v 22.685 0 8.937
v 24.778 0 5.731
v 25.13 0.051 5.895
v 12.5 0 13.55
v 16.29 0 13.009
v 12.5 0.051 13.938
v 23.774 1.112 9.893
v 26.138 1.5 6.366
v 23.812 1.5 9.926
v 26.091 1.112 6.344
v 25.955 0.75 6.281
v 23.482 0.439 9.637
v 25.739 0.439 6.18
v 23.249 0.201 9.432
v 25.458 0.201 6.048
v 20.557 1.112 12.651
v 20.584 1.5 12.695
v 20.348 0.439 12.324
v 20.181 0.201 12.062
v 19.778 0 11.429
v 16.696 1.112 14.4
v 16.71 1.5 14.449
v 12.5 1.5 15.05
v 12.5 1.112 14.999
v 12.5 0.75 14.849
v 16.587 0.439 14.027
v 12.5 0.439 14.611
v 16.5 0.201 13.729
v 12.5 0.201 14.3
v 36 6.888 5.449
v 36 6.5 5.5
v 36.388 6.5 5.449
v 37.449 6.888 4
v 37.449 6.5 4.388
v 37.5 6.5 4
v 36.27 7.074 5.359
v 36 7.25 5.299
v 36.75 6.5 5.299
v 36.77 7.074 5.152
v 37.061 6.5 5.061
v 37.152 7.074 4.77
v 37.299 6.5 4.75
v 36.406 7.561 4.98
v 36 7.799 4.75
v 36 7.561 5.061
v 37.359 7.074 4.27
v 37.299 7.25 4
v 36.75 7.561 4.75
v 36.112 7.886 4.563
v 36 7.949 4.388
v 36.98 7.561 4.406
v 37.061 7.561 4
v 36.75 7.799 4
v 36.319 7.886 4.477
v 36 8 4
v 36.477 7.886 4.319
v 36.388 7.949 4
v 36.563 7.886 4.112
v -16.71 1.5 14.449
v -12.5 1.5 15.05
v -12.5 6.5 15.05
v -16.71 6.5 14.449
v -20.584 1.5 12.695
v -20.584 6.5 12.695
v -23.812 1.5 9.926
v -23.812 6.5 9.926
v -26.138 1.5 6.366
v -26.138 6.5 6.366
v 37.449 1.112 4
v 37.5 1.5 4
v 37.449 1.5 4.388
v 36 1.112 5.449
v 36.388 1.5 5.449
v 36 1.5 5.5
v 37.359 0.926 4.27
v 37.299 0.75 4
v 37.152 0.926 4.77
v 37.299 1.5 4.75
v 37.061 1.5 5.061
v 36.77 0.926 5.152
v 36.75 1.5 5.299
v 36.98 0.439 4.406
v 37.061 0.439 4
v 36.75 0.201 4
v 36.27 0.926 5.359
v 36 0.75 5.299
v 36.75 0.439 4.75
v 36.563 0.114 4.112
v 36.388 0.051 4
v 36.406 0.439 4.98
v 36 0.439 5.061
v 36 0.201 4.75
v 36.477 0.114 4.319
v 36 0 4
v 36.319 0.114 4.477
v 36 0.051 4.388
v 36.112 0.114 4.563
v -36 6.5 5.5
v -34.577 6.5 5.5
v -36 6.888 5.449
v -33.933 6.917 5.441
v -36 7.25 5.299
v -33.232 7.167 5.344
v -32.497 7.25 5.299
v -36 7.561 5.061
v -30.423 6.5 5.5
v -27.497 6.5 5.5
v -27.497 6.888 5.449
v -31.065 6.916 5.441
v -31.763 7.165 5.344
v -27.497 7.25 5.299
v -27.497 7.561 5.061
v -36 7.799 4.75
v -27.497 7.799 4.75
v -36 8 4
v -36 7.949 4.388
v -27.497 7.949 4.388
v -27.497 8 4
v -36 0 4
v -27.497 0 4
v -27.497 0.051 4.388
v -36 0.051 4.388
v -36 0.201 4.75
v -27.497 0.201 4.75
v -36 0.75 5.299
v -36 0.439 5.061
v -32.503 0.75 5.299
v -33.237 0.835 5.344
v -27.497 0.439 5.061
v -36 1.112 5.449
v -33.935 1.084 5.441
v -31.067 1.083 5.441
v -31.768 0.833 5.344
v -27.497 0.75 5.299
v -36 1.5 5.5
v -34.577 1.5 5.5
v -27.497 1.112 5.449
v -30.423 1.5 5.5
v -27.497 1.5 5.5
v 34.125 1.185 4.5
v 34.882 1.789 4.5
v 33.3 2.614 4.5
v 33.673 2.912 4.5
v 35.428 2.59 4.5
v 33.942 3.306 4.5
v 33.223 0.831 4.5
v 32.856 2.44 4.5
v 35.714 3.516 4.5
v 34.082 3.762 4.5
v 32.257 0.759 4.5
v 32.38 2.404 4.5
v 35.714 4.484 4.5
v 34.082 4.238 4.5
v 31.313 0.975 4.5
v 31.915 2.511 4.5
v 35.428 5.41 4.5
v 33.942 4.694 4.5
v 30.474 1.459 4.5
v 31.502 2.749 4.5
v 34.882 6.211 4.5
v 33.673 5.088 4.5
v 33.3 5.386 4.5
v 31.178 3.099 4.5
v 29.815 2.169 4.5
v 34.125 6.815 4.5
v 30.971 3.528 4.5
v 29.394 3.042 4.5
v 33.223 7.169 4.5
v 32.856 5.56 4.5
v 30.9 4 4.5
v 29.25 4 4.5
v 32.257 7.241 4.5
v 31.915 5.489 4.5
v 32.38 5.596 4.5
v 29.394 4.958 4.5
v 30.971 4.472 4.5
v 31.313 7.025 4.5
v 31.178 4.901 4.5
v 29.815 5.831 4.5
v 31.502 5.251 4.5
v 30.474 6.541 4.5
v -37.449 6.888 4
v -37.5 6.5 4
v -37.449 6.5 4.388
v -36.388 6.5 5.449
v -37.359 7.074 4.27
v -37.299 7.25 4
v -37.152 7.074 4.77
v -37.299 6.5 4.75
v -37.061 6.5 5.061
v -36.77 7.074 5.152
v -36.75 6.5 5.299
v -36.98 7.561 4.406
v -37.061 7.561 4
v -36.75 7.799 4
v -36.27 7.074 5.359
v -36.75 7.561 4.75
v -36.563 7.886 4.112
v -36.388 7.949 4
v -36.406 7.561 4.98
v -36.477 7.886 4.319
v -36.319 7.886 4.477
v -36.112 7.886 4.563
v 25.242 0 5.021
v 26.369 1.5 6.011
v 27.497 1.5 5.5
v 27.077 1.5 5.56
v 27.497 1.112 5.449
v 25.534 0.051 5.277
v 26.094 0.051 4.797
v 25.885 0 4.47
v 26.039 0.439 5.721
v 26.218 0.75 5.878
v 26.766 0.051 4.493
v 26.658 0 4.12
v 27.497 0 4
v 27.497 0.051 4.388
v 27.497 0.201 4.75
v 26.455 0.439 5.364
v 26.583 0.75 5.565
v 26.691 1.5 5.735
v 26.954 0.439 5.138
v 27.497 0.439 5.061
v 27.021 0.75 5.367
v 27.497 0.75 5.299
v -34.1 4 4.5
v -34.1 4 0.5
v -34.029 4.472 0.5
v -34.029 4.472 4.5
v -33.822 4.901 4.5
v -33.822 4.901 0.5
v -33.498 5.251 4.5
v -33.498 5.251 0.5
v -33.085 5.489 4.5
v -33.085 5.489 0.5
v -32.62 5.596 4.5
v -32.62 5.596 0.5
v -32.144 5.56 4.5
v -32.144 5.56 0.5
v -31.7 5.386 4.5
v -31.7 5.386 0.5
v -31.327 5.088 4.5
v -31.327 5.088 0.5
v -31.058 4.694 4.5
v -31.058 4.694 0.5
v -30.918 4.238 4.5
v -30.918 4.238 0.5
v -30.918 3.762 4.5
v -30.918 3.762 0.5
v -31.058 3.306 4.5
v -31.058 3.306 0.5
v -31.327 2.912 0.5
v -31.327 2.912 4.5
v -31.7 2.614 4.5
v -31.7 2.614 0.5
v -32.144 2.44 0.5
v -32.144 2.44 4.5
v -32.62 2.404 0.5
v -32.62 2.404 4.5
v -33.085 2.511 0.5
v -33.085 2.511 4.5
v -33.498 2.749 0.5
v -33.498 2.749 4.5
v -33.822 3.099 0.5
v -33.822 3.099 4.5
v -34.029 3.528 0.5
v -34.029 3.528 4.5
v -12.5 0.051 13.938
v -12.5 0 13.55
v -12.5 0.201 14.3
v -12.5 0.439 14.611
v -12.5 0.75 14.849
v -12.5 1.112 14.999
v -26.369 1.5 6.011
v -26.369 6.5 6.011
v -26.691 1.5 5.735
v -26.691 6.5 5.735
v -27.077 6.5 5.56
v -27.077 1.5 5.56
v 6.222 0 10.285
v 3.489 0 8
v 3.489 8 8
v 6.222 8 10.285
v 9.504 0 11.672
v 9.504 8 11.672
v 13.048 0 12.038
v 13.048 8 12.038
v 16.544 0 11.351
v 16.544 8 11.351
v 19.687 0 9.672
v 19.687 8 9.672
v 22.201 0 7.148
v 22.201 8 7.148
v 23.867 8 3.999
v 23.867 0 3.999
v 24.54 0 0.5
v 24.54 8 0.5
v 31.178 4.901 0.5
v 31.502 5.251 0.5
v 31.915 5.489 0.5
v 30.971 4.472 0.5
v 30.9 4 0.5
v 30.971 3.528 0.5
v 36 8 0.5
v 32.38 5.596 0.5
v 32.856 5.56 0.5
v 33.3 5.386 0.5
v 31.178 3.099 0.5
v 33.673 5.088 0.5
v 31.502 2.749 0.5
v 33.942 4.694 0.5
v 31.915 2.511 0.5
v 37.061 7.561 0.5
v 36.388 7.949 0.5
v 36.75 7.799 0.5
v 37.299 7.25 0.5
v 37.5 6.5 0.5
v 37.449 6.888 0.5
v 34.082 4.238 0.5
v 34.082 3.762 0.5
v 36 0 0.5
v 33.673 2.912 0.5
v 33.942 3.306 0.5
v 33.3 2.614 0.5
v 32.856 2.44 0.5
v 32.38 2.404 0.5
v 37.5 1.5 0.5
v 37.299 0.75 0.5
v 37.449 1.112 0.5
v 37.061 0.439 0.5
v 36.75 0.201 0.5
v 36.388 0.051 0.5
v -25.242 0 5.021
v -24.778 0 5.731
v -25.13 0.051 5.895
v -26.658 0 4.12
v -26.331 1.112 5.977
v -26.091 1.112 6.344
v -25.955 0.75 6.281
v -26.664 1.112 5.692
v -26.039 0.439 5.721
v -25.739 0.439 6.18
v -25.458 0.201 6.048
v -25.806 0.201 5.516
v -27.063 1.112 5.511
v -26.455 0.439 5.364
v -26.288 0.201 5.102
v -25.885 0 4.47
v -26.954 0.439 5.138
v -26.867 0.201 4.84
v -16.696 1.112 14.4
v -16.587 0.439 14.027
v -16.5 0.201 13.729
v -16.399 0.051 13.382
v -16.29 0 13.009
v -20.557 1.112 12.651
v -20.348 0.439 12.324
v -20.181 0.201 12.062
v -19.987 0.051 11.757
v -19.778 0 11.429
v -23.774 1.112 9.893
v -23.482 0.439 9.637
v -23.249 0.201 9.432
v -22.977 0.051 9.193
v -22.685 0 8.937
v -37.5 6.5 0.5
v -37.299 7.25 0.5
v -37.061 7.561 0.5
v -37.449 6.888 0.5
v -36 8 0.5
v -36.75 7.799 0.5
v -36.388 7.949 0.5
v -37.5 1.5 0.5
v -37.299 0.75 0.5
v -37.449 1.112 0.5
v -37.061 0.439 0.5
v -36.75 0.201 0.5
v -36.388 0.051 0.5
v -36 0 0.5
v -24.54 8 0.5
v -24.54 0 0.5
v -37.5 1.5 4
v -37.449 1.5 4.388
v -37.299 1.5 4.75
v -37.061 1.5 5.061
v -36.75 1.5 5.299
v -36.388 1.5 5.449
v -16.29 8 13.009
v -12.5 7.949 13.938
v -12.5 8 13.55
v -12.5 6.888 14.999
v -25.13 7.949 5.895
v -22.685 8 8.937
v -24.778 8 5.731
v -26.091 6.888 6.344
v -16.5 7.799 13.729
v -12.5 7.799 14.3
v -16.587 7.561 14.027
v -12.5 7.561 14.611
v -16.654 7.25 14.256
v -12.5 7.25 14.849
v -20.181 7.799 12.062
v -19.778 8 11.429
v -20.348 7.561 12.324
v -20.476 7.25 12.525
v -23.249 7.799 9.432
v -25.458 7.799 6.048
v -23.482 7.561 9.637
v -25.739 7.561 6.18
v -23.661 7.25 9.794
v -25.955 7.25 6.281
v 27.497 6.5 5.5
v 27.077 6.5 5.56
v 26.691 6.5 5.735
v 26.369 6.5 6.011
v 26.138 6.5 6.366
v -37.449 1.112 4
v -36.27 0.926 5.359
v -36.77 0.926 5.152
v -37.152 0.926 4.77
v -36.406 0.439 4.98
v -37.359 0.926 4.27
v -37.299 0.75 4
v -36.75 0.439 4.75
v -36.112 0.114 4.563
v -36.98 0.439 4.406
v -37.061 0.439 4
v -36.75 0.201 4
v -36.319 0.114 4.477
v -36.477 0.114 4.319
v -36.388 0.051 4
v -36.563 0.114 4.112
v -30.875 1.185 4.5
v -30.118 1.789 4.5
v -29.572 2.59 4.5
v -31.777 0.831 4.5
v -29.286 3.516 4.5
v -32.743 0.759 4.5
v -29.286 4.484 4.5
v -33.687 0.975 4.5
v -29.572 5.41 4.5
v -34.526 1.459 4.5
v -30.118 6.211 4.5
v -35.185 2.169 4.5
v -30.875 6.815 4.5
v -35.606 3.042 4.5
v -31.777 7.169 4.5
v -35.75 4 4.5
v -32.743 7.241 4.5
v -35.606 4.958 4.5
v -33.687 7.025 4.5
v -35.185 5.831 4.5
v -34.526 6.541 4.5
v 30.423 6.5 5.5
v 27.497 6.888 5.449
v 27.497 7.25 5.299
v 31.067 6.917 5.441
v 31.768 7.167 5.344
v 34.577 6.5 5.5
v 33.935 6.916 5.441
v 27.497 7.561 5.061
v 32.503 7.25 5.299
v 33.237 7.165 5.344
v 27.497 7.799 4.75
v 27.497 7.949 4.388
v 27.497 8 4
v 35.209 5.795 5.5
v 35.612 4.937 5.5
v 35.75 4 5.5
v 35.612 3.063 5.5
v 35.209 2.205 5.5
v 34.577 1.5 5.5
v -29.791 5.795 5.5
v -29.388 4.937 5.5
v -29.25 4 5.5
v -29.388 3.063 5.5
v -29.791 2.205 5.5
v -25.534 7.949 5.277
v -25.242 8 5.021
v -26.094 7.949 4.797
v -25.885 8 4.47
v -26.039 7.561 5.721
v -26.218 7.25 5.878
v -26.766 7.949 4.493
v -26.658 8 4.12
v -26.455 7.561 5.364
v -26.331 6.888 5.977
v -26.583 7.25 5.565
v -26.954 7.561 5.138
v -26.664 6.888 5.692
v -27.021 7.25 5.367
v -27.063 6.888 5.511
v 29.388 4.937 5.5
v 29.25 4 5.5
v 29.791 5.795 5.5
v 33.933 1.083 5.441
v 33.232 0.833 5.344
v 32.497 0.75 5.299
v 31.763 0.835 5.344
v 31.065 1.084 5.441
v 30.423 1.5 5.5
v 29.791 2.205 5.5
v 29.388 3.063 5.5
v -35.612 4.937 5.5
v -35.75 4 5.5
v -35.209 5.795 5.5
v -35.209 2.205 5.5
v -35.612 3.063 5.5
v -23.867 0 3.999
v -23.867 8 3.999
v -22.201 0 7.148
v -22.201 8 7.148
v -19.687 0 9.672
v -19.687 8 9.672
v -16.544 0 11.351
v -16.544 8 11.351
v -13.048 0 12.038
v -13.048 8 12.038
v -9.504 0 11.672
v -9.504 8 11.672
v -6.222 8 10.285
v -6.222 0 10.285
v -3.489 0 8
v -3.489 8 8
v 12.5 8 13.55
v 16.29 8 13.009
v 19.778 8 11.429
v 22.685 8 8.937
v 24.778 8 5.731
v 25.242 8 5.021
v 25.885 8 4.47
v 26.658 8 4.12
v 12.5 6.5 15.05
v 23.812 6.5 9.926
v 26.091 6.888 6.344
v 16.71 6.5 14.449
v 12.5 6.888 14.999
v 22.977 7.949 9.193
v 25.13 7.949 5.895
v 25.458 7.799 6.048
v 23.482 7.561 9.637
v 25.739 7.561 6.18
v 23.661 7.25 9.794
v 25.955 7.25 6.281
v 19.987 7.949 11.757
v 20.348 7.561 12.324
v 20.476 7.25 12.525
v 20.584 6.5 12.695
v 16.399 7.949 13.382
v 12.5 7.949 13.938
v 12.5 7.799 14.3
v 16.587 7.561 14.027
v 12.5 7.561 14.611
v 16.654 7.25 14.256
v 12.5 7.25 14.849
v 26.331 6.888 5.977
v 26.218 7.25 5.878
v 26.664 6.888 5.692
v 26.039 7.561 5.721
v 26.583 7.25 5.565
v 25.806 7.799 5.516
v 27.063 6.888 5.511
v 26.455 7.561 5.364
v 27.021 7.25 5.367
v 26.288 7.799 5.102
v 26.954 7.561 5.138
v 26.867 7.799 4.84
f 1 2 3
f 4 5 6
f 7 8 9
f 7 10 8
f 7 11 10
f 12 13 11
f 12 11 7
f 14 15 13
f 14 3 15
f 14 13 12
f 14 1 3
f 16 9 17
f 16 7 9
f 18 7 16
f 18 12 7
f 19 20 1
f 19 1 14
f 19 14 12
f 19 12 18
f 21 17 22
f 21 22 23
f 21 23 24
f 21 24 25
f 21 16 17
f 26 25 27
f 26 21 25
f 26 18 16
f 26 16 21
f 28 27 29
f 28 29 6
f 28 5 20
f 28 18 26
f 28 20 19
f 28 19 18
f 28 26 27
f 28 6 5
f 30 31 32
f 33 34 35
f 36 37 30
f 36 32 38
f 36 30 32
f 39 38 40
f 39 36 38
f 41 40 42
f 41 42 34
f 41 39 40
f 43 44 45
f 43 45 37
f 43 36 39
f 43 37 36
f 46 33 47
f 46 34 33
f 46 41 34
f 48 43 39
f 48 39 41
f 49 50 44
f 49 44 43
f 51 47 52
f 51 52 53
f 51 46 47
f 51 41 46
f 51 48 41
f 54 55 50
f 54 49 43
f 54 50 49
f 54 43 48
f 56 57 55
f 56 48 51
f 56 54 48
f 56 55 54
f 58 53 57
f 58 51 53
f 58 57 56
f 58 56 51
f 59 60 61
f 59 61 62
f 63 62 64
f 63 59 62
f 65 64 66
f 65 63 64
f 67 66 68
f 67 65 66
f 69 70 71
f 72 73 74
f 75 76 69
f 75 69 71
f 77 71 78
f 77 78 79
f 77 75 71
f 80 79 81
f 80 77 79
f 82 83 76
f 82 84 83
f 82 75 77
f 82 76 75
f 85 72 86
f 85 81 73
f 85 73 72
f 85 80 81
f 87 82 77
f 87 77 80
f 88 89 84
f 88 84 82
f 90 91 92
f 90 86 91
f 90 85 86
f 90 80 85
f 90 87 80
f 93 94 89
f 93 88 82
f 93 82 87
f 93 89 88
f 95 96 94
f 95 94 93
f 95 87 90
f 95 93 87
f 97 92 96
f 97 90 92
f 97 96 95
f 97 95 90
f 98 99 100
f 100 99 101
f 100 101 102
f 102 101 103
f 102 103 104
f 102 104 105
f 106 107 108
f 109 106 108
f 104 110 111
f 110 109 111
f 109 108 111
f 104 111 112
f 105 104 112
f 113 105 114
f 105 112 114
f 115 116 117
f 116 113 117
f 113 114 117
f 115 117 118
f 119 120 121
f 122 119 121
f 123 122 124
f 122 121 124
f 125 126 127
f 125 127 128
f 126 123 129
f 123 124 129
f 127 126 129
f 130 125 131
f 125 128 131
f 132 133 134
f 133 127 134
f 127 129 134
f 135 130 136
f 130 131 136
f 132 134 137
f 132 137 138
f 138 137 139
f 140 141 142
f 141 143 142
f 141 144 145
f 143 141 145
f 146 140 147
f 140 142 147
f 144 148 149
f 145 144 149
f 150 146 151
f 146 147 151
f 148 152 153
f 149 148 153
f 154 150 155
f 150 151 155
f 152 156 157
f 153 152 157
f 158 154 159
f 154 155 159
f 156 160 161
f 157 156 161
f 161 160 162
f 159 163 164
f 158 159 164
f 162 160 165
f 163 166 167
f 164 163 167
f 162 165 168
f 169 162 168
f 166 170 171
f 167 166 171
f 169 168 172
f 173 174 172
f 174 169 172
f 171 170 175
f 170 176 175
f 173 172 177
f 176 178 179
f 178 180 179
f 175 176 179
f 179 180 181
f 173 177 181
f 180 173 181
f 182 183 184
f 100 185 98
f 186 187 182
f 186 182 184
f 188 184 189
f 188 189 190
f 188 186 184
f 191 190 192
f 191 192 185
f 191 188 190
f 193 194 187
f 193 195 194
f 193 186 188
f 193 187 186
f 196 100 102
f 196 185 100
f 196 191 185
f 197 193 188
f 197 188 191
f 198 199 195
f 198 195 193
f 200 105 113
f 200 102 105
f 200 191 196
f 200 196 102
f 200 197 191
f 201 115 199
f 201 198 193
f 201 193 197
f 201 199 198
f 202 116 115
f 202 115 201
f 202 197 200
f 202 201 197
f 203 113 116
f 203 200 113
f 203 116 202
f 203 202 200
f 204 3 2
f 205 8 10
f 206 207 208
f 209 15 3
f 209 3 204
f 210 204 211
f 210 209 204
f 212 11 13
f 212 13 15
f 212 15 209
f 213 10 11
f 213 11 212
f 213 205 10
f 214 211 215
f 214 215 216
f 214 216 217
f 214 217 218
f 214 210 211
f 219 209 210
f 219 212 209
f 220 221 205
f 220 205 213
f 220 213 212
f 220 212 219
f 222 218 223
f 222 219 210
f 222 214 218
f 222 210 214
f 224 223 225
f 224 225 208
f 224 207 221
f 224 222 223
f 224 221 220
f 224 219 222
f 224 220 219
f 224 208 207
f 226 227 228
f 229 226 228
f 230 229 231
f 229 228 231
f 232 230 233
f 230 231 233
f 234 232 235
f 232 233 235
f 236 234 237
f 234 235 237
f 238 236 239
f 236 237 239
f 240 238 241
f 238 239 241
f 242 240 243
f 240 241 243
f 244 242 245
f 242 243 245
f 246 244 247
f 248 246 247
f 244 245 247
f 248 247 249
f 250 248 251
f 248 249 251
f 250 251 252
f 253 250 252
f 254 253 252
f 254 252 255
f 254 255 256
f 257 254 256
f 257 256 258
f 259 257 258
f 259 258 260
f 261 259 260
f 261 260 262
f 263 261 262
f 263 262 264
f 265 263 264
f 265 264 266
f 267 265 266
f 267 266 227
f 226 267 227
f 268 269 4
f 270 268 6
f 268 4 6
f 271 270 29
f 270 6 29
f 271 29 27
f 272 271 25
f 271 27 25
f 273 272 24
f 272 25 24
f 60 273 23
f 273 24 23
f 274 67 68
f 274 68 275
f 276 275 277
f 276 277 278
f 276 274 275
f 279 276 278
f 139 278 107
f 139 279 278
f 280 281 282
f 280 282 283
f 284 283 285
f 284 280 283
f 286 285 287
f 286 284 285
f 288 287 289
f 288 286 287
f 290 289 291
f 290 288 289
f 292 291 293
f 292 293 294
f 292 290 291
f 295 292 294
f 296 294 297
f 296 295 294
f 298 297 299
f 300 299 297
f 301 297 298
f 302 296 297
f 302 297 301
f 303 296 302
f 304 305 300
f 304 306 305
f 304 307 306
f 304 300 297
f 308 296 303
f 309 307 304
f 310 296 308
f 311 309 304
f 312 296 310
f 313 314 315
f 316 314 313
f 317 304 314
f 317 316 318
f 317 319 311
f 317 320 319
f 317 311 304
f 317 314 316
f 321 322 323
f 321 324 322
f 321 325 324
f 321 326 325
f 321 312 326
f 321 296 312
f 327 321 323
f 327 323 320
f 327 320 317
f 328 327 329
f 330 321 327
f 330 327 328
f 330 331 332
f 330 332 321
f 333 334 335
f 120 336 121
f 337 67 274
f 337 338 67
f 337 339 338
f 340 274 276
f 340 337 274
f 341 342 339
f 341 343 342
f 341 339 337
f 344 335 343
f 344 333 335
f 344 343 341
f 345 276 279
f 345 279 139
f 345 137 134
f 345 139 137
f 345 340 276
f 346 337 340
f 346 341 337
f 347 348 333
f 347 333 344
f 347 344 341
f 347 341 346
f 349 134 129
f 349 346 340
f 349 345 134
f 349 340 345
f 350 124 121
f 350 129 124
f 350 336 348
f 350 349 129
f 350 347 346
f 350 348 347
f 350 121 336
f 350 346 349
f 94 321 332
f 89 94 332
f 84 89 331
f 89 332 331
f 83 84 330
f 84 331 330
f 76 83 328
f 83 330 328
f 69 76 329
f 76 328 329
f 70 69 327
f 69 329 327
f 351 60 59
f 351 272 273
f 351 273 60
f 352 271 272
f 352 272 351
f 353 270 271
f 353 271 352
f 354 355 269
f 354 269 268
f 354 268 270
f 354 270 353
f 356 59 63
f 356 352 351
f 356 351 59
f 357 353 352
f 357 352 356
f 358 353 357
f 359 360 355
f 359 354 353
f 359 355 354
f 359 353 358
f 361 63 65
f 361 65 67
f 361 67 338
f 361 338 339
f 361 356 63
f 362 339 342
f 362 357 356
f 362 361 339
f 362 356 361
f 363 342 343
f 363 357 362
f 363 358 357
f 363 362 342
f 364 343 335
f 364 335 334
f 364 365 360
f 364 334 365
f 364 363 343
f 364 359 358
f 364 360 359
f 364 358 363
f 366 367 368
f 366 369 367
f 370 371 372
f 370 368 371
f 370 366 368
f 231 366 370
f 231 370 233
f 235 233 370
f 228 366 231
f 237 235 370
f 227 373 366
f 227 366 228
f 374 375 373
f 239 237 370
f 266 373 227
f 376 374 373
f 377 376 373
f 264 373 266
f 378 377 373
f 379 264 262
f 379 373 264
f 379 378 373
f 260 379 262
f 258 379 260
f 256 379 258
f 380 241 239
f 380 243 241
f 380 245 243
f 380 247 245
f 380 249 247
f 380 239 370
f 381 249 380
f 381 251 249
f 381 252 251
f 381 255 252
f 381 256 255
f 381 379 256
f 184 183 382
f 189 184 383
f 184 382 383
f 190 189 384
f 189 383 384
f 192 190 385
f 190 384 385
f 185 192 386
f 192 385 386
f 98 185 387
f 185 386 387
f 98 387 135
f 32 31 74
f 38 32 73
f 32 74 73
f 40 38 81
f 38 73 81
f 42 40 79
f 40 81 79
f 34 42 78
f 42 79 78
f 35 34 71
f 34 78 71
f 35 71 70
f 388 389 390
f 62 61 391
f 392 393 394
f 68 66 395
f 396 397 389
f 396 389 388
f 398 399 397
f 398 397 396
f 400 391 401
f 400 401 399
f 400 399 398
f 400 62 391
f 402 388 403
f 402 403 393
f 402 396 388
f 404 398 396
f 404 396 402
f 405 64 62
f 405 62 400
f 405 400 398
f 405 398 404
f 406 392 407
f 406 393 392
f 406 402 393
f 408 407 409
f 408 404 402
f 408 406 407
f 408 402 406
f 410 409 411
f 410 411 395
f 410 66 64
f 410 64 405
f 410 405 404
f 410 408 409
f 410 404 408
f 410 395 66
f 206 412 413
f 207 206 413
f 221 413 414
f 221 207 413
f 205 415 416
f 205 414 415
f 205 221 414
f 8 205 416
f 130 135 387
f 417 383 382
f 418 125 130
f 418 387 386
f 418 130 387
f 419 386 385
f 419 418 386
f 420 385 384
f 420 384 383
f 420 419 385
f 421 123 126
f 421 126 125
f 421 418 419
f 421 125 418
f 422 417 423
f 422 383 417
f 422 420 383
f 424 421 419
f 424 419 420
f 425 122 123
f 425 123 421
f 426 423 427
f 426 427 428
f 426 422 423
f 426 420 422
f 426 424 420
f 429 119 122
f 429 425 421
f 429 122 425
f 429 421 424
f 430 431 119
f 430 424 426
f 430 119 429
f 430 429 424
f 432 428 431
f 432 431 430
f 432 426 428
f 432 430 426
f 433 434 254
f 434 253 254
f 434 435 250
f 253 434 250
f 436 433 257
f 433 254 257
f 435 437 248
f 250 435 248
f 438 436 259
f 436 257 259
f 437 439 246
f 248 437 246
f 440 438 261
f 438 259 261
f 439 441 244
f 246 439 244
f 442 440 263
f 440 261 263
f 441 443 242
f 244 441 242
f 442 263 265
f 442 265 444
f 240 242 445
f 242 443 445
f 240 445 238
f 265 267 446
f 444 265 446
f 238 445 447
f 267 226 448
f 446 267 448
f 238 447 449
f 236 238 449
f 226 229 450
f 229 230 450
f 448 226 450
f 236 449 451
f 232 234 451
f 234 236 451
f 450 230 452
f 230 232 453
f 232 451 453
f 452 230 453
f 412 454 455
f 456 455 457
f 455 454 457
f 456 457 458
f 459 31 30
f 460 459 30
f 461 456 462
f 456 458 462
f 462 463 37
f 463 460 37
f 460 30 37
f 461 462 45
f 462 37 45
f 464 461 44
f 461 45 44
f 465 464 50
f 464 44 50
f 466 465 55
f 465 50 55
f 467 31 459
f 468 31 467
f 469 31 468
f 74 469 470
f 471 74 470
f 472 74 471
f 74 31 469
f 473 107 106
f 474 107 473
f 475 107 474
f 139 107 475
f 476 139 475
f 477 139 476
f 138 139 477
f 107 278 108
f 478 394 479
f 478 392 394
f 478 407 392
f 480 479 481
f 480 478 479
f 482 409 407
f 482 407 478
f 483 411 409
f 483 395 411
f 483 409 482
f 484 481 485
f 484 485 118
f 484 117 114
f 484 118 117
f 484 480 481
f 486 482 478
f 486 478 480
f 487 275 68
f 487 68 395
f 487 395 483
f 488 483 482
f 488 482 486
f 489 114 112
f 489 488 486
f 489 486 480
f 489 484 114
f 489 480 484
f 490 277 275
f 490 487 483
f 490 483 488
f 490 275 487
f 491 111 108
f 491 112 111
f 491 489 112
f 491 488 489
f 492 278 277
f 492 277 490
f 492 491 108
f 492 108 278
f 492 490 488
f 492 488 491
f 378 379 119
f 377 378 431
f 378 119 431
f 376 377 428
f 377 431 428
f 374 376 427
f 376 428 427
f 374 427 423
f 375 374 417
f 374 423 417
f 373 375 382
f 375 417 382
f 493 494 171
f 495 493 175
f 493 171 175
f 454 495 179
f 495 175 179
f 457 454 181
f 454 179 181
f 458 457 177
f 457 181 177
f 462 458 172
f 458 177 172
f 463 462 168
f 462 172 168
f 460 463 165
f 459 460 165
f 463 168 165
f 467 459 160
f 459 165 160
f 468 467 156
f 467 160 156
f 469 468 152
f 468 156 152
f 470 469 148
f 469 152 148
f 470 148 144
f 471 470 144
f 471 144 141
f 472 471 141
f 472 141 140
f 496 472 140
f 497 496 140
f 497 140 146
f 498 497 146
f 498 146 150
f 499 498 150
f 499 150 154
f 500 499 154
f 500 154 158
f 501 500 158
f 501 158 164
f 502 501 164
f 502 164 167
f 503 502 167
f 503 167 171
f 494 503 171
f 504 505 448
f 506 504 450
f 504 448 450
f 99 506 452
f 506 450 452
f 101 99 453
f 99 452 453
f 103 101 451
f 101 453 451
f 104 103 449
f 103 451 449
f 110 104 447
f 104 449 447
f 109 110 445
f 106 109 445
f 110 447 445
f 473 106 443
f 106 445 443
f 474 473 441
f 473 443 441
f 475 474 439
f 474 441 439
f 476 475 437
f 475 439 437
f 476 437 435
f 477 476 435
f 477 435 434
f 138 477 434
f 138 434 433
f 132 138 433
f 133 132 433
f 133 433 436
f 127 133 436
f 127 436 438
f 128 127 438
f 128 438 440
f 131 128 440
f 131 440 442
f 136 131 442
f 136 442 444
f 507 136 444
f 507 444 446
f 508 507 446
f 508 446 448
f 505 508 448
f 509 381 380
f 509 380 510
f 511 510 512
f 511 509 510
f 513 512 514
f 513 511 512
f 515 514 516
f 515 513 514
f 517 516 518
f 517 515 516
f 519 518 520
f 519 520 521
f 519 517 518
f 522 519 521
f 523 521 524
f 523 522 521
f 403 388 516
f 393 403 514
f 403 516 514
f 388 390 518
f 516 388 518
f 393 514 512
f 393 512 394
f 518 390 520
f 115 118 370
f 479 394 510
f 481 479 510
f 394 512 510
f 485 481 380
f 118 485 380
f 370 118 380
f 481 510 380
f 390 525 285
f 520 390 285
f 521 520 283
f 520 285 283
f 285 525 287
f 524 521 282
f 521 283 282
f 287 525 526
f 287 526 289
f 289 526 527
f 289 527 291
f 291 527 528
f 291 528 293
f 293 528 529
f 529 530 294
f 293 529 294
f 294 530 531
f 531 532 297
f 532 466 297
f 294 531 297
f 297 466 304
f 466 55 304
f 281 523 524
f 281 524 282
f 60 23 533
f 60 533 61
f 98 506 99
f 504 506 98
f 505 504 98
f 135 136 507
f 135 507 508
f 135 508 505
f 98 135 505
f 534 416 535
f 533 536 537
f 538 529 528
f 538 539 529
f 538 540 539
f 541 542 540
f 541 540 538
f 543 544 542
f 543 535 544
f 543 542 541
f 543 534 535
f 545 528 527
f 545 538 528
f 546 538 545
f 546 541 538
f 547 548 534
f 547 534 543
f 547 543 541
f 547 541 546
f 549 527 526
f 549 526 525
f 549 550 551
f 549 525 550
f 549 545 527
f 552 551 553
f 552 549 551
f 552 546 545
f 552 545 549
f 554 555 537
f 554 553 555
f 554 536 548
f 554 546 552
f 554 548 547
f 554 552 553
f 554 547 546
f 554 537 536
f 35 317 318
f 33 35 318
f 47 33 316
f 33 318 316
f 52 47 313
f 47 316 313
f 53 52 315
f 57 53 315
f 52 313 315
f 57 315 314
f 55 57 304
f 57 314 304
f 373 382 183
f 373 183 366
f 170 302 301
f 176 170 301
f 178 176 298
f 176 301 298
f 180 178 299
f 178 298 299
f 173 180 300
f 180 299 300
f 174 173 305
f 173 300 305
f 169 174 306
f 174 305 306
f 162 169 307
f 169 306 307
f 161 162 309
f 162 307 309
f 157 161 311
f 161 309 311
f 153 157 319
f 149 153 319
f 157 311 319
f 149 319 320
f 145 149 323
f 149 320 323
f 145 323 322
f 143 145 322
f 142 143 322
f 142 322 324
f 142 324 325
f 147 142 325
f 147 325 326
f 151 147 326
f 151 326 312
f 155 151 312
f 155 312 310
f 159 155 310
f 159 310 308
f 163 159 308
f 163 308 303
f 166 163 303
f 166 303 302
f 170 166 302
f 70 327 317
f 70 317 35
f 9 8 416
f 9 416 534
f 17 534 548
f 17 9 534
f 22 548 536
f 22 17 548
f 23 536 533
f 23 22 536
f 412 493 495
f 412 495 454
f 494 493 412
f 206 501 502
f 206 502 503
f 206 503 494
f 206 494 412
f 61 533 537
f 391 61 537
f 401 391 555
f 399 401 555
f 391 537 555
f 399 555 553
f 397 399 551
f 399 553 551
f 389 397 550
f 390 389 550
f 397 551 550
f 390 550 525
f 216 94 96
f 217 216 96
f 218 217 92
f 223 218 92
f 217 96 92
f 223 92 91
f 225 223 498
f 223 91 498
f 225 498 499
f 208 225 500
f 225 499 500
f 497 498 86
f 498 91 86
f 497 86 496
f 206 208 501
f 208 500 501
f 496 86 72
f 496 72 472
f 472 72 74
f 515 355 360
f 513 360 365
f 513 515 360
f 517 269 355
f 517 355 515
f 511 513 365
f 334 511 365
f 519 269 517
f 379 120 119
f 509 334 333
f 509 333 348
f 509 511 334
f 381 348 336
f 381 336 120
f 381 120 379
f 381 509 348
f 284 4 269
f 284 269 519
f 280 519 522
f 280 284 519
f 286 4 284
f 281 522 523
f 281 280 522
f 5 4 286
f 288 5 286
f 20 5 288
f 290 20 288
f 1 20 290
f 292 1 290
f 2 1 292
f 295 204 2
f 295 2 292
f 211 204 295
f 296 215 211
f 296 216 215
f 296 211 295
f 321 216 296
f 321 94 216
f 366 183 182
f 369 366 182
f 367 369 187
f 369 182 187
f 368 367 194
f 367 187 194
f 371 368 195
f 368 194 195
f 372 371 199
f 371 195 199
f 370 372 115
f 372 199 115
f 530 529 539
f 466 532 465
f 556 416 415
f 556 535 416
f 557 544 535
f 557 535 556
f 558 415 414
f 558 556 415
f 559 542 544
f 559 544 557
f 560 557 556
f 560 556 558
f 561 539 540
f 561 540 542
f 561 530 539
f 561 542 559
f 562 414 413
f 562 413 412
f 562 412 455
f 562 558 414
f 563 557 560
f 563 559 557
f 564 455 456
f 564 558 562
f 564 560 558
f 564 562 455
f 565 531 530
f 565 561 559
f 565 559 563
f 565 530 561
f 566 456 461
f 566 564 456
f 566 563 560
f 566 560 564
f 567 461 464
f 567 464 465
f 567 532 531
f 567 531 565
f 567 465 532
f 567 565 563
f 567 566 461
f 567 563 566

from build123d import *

# Parameters (mm, degrees)
BOSS_EXTRU_1_DEPTH      = 8
ESQUISSE2_R             = 1.6
ENL_V_MAT_EXTRU_1_DEPTH = 42.011614209
ENL_V_START             = -4
ESQUISSE3_R             = 3.25
ENL_V_MAT_EXTRU_2_DEPTH = 38.011614209
CONG_1_R                = 1.5


with BuildPart() as part:
    # Esquisse1 → Boss.-Extru.1 (new body)
    with BuildSketch(Plane(origin=(0, 0, 0), x_dir=(1, 0, 0), z_dir=(0, 1, 0))):
        with BuildLine():
            Line((-37.5, -0.5), (-24.539622087, -0.5))
            ThreePointArc((-24.539622087, -0.5), (-16.544164933, -11.351089375), (-3.488757022, -8))
            Line((-3.488757022, -8), (3.488757022, -8))
            ThreePointArc((3.488757022, -8), (16.544164933, -11.351089375), (24.539622087, -0.5))
            Line((24.539622087, -0.5), (37.5, -0.5))
            Line((37.5, -0.5), (37.5, -5.5))
            Line((37.5, -5.5), (26.509014955, -5.5))
            ThreePointArc((26.509014955, -5.5), (20.977248964, -12.435382986), (12.5, -15.05))
            Line((12.5, -15.05), (-12.5, -15.05))
            ThreePointArc((-12.5, -15.05), (-20.977248964, -12.435382986), (-26.509014955, -5.5))
            Line((-26.509014955, -5.5), (-37.5, -5.5))
            Line((-37.5, -5.5), (-37.5, -0.5))
        make_face()
    extrude(amount=BOSS_EXTRU_1_DEPTH)

    # Esquisse2 → Enlèv. mat.-Extru.1 (cut, through all)
    with BuildSketch(Plane(origin=(0, 0, 0.5), x_dir=(-1, 0, 0), z_dir=(0, 0, -1))):
        with Locations((32.5, 4)):
            Circle(ESQUISSE2_R)
        with Locations((-32.5, 4)):
            Circle(ESQUISSE2_R)
    extrude(amount=-ENL_V_MAT_EXTRU_1_DEPTH, mode=Mode.SUBTRACT)

    # Esquisse3 → Enlèv. mat.-Extru.2 (cut, through all)
    with BuildSketch(Plane(origin=(0, 0, 0.5), x_dir=(-1, 0, 0), z_dir=(0, 0, -1)).offset(ENL_V_START)):
        with Locations((32.5, 4)):
            Circle(ESQUISSE3_R)
        with Locations((-32.5, 4)):
            Circle(ESQUISSE3_R)
    extrude(amount=-ENL_V_MAT_EXTRU_2_DEPTH, mode=Mode.SUBTRACT)

    # Congé1
    # the kernel refuses this fillet: 1.5 mm, written as the material it adds along each edge
    with BuildSketch(Plane(origin=(26.509014955, 0, 5.5), x_dir=(-0.3943977660181821, 0, 0.9189398251027471), z_dir=(0, 1, 0))) as cong_1_piece_1:
        with BuildLine():
            CenterArc((0.988849381, 1.499265395), CONG_1_R, 203.228419566, 64.978347937)
            Line((-0.389560356, 0.907668746), (0, 0))
            ThreePointArc((0, 0), (0.470955164, 0.007370535), (0.941910328, 0))
        make_face()
    extrude(amount=8)
    with BuildSketch(Plane(origin=(-26.509014955, 0, 5.5), x_dir=(0.3943977660181821, 0, 0.9189398251027471), z_dir=(0, 1, 0))) as cong_1_piece_2:
        with BuildLine():
            CenterArc((0.988849381, -1.499265395), CONG_1_R, 91.793232497, 64.978347937)
            Line((-0.389560356, -0.907668746), (0, 0))
            ThreePointArc((0, 0), (0.470955164, -0.007370535), (0.941910328, 0))
        make_face()
    extrude(amount=8)
    # the kernel refuses this fillet: 1.5 mm, written as the material it takes off along each edge
    with BuildSketch(Plane(origin=(37.5, 0, -3.25), x_dir=(-1, 0, 0), z_dir=(0, 0, 1)), Plane(origin=(-37.5, 0, 9.25), x_dir=(1, 0, 0), z_dir=(0, 0, -1))) as cong_1_2_piece_1:
        with BuildLine():
            CenterArc((CONG_1_R, -CONG_1_R), CONG_1_R, 90, 90)
            Line((0, -CONG_1_R), (0, 0))
            Line((0, 0), (CONG_1_R, 0))
        make_face()
    extrude(amount=12.5, mode=Mode.SUBTRACT)
    with BuildSketch(Plane(origin=(-37.5, 8, 9.25), x_dir=(1, 0, 0), z_dir=(0, 0, -1)), Plane(origin=(37.5, 8, -3.25), x_dir=(-1, 0, 0), z_dir=(0, 0, 1))) as cong_1_2_piece_2:
        with BuildLine():
            CenterArc((CONG_1_R, CONG_1_R), CONG_1_R, 180, 90)
            Line((0, CONG_1_R), (0, 0))
            Line((0, 0), (CONG_1_R, 0))
        make_face()
    extrude(amount=12.5, mode=Mode.SUBTRACT)
    with BuildSketch(Plane(origin=(37.5, -3.75, 5.5), x_dir=(0, 0, -1), z_dir=(0, 1, 0)), Plane(origin=(-37.5, -3.75, 5.5), x_dir=(1, 0, 0), z_dir=(0, 1, 0))) as cong_1_2_piece_3:
        with BuildLine():
            CenterArc((CONG_1_R, CONG_1_R), CONG_1_R, 180, 90)
            Line((0, CONG_1_R), (0, 0))
            Line((0, 0), (CONG_1_R, 0))
        make_face()
    extrude(amount=15.5, mode=Mode.SUBTRACT)
    # the kernel refuses this fillet: 1.5 mm, written as the material it takes off along each edge
    with BuildSketch(Plane(origin=(36, 6.5, 4), x_dir=(0, 0, 1), z_dir=(0, 1, 0))) as cong_1_3_piece_1_section:
        Polygon((0, 0), (CONG_1_R, 0), (CONG_1_R, CONG_1_R), (0, CONG_1_R), align=None)
    cong_1_3_piece_1 = extrude(amount=CONG_1_R, mode=Mode.PRIVATE)
    cong_1_3_piece_1 = cong_1_3_piece_1 - Plane(origin=(36, 6.5, 4), x_dir=(-0.7071067811865475, 0, -0.7071067811865475), z_dir=(0, 1, 0)) * Sphere(CONG_1_R, mode=Mode.PRIVATE)
    add(cong_1_3_piece_1, mode=Mode.SUBTRACT)
    with BuildSketch(Plane(origin=(-36, 6.5, 4), x_dir=(0, 0, 1), z_dir=(0, 1, 0))) as cong_1_3_piece_2_section:
        Polygon((0, 0), (CONG_1_R, 0), (CONG_1_R, -CONG_1_R), (0, -CONG_1_R), align=None)
    cong_1_3_piece_2 = extrude(amount=CONG_1_R, mode=Mode.PRIVATE)
    cong_1_3_piece_2 = cong_1_3_piece_2 - Plane(origin=(-36, 6.5, 4), x_dir=(0.7071067811865475, 0, -0.7071067811865475), z_dir=(0, 1, 0)) * Sphere(CONG_1_R, mode=Mode.PRIVATE)
    add(cong_1_3_piece_2, mode=Mode.SUBTRACT)
    with BuildSketch(Plane(origin=(-36, 1.5, 4), x_dir=(0, 0, 1), z_dir=(0, -1, 0))) as cong_1_3_piece_3_section:
        Polygon((0, 0), (CONG_1_R, 0), (CONG_1_R, CONG_1_R), (0, CONG_1_R), align=None)
    cong_1_3_piece_3 = extrude(amount=CONG_1_R, mode=Mode.PRIVATE)
    cong_1_3_piece_3 = cong_1_3_piece_3 - Plane(origin=(-36, 1.5, 4), x_dir=(0.7071067811865475, 0, -0.7071067811865475), z_dir=(0, -1, 0)) * Sphere(CONG_1_R, mode=Mode.PRIVATE)
    add(cong_1_3_piece_3, mode=Mode.SUBTRACT)
    with BuildSketch(Plane(origin=(36, 1.5, 4), x_dir=(0, 0, 1), z_dir=(0, -1, 0))) as cong_1_3_piece_4_section:
        Polygon((0, 0), (CONG_1_R, 0), (CONG_1_R, -CONG_1_R), (0, -CONG_1_R), align=None)
    cong_1_3_piece_4 = extrude(amount=CONG_1_R, mode=Mode.PRIVATE)
    cong_1_3_piece_4 = cong_1_3_piece_4 - Plane(origin=(36, 1.5, 4), x_dir=(-0.7071067811865475, 0, -0.7071067811865475), z_dir=(0, -1, 0)) * Sphere(CONG_1_R, mode=Mode.PRIVATE)
    add(cong_1_3_piece_4, mode=Mode.SUBTRACT)
    with BuildSketch(Plane(origin=(36, 0, 5.5), x_dir=(0, 0, -1), z_dir=(-1, 0, 0)), Plane(origin=(-27.496749648, 0, 5.5), x_dir=(0, 0, -1), z_dir=(-1, 0, 0))) as cong_1_3_piece_5:
        with BuildLine():
            CenterArc((CONG_1_R, -CONG_1_R), CONG_1_R, 90, 90)
            Line((0, -CONG_1_R), (0, 0))
            Line((0, 0), (CONG_1_R, 0))
        make_face()
    extrude(amount=8.503250352, mode=Mode.SUBTRACT)
    with BuildSketch(Plane(origin=(12.5, 0, 0), x_dir=(0.9061480149752484, 0, 0.4229607250755286), z_dir=(0.4229607250755286, 0, -0.9061480149752484))) as cong_1_3_piece_6:
        with BuildLine():
            CenterArc((15.05 - CONG_1_R, -CONG_1_R), CONG_1_R, 0, 90)
            Line((15.05 - CONG_1_R, 0), (15.05, 0))
            Line((15.05, 0), (15.05, -CONG_1_R))
        make_face()
    revolve(axis=Axis((12.5, 0, 0), (0, -1, 0)), revolution_arc=64.978347937, mode=Mode.SUBTRACT)
    with BuildSketch(Plane(origin=(12.5, 0, 15.05), x_dir=(0, 0, -1), z_dir=(-1, 0, 0)), Plane(origin=(12.5, 8, 15.05), x_dir=(0, -1, 0), z_dir=(-1, 0, 0))) as cong_1_3_piece_7:
        with BuildLine():
            CenterArc((CONG_1_R, -CONG_1_R), CONG_1_R, 90, 90)
            Line((0, -CONG_1_R), (0, 0))
            Line((0, 0), (CONG_1_R, 0))
        make_face()
    extrude(amount=25, mode=Mode.SUBTRACT)
    with BuildSketch(Plane(origin=(-12.5, 0, 0), x_dir=(0, 0, 1), z_dir=(1, 0, 0))) as cong_1_3_piece_8:
        with BuildLine():
            CenterArc((15.05 - CONG_1_R, -CONG_1_R), CONG_1_R, 0, 90)
            Line((15.05, -CONG_1_R), (15.05, 0))
            Line((15.05, 0), (15.05 - CONG_1_R, 0))
        make_face()
    revolve(axis=Axis((-12.5, 0, 0), (0, -1, 0)), revolution_arc=64.978347937, mode=Mode.SUBTRACT)
    with BuildSketch(Plane(origin=(-27.496749648, 8, 5.5), x_dir=(0, 0, -1), z_dir=(-1, 0, 0)), Plane(origin=(36, 8, 5.5), x_dir=(0, 0, -1), z_dir=(-1, 0, 0))) as cong_1_3_piece_9:
        with BuildLine():
            CenterArc((CONG_1_R, CONG_1_R), CONG_1_R, 180, 90)
            Line((0, CONG_1_R), (0, 0))
            Line((0, 0), (CONG_1_R, 0))
        make_face()
    extrude(amount=8.503250352, mode=Mode.SUBTRACT)
    with BuildSketch(Plane(origin=(-12.5, 8, 0), x_dir=(0, 0, 1), z_dir=(1, 0, 0))) as cong_1_3_piece_10:
        with BuildLine():
            CenterArc((15.05 - CONG_1_R, CONG_1_R), CONG_1_R, 270, 90)
            Line((15.05, CONG_1_R), (15.05, 0))
            Line((15.05, 0), (15.05 - CONG_1_R, 0))
        make_face()
    revolve(axis=Axis((-12.5, 8, 0), (0, -1, 0)), revolution_arc=64.978347937, mode=Mode.SUBTRACT)
    with BuildSketch(Plane(origin=(12.5, 8, 0), x_dir=(0.9061480149752484, 0, 0.4229607250755286), z_dir=(0.4229607250755286, 0, -0.9061480149752484))) as cong_1_3_piece_11:
        with BuildLine():
            CenterArc((15.05 - CONG_1_R, CONG_1_R), CONG_1_R, 270, 90)
            Line((15.05 - CONG_1_R, 0), (15.05, 0))
            Line((15.05, 0), (15.05, CONG_1_R))
        make_face()
    revolve(axis=Axis((12.5, 8, 0), (0, -1, 0)), revolution_arc=64.978347937, mode=Mode.SUBTRACT)
    with BuildSketch(Plane(origin=(27.496749648, 8, 7), x_dir=(-0.9061480149752484, 0, -0.4229607250755287), z_dir=(-0.4229607250755287, 0, 0.9061480149752484))) as cong_1_3_piece_12:
        with BuildLine():
            CenterArc((1.5 + CONG_1_R, CONG_1_R), CONG_1_R, 180, 90)
            Line((1.5, CONG_1_R), (1.5, 0))
            Line((1.5, 0), (1.5 + CONG_1_R, 0))
        make_face()
    revolve(axis=Axis((27.496749648, 8, 7), (0, -1, 0)), revolution_arc=64.978347937, mode=Mode.SUBTRACT)
    with BuildSketch(Plane(origin=(-27.496749648, 8, 7), x_dir=(0.9061480149752487, 0, -0.42296072507552823), z_dir=(0.42296072507552823, 0, 0.9061480149752487))) as cong_1_3_piece_13:
        with BuildLine():
            CenterArc((1.5 + CONG_1_R, -CONG_1_R), CONG_1_R, 90, 90)
            Line((1.5, -CONG_1_R), (1.5, 0))
            Line((1.5, 0), (1.5 + CONG_1_R, 0))
        make_face()
    revolve(axis=Axis((-27.496749648, 8, 7), (0, 1, 0)), revolution_arc=64.978347937, mode=Mode.SUBTRACT)
    with BuildSketch(Plane(origin=(-27.496749648, 0, 7), x_dir=(0.9061480149752487, 0, -0.42296072507552823), z_dir=(0.42296072507552823, 0, 0.9061480149752487))) as cong_1_3_piece_14:
        with BuildLine():
            CenterArc((1.5 + CONG_1_R, CONG_1_R), CONG_1_R, 180, 90)
            Line((1.5, CONG_1_R), (1.5, 0))
            Line((1.5, 0), (1.5 + CONG_1_R, 0))
        make_face()
    revolve(axis=Axis((-27.496749648, 0, 7), (0, 1, 0)), revolution_arc=64.978347937, mode=Mode.SUBTRACT)
    with BuildSketch(Plane(origin=(27.496749648, 0, 7), x_dir=(-0.9061480149752484, 0, -0.4229607250755287), z_dir=(-0.4229607250755287, 0, 0.9061480149752484))) as cong_1_3_piece_15:
        with BuildLine():
            CenterArc((1.5 + CONG_1_R, -CONG_1_R), CONG_1_R, 90, 90)
            Line((1.5, -CONG_1_R), (1.5, 0))
            Line((1.5, 0), (1.5 + CONG_1_R, 0))
        make_face()
    revolve(axis=Axis((27.496749648, 0, 7), (0, -1, 0)), revolution_arc=64.978347937, mode=Mode.SUBTRACT)


solid = part.part
